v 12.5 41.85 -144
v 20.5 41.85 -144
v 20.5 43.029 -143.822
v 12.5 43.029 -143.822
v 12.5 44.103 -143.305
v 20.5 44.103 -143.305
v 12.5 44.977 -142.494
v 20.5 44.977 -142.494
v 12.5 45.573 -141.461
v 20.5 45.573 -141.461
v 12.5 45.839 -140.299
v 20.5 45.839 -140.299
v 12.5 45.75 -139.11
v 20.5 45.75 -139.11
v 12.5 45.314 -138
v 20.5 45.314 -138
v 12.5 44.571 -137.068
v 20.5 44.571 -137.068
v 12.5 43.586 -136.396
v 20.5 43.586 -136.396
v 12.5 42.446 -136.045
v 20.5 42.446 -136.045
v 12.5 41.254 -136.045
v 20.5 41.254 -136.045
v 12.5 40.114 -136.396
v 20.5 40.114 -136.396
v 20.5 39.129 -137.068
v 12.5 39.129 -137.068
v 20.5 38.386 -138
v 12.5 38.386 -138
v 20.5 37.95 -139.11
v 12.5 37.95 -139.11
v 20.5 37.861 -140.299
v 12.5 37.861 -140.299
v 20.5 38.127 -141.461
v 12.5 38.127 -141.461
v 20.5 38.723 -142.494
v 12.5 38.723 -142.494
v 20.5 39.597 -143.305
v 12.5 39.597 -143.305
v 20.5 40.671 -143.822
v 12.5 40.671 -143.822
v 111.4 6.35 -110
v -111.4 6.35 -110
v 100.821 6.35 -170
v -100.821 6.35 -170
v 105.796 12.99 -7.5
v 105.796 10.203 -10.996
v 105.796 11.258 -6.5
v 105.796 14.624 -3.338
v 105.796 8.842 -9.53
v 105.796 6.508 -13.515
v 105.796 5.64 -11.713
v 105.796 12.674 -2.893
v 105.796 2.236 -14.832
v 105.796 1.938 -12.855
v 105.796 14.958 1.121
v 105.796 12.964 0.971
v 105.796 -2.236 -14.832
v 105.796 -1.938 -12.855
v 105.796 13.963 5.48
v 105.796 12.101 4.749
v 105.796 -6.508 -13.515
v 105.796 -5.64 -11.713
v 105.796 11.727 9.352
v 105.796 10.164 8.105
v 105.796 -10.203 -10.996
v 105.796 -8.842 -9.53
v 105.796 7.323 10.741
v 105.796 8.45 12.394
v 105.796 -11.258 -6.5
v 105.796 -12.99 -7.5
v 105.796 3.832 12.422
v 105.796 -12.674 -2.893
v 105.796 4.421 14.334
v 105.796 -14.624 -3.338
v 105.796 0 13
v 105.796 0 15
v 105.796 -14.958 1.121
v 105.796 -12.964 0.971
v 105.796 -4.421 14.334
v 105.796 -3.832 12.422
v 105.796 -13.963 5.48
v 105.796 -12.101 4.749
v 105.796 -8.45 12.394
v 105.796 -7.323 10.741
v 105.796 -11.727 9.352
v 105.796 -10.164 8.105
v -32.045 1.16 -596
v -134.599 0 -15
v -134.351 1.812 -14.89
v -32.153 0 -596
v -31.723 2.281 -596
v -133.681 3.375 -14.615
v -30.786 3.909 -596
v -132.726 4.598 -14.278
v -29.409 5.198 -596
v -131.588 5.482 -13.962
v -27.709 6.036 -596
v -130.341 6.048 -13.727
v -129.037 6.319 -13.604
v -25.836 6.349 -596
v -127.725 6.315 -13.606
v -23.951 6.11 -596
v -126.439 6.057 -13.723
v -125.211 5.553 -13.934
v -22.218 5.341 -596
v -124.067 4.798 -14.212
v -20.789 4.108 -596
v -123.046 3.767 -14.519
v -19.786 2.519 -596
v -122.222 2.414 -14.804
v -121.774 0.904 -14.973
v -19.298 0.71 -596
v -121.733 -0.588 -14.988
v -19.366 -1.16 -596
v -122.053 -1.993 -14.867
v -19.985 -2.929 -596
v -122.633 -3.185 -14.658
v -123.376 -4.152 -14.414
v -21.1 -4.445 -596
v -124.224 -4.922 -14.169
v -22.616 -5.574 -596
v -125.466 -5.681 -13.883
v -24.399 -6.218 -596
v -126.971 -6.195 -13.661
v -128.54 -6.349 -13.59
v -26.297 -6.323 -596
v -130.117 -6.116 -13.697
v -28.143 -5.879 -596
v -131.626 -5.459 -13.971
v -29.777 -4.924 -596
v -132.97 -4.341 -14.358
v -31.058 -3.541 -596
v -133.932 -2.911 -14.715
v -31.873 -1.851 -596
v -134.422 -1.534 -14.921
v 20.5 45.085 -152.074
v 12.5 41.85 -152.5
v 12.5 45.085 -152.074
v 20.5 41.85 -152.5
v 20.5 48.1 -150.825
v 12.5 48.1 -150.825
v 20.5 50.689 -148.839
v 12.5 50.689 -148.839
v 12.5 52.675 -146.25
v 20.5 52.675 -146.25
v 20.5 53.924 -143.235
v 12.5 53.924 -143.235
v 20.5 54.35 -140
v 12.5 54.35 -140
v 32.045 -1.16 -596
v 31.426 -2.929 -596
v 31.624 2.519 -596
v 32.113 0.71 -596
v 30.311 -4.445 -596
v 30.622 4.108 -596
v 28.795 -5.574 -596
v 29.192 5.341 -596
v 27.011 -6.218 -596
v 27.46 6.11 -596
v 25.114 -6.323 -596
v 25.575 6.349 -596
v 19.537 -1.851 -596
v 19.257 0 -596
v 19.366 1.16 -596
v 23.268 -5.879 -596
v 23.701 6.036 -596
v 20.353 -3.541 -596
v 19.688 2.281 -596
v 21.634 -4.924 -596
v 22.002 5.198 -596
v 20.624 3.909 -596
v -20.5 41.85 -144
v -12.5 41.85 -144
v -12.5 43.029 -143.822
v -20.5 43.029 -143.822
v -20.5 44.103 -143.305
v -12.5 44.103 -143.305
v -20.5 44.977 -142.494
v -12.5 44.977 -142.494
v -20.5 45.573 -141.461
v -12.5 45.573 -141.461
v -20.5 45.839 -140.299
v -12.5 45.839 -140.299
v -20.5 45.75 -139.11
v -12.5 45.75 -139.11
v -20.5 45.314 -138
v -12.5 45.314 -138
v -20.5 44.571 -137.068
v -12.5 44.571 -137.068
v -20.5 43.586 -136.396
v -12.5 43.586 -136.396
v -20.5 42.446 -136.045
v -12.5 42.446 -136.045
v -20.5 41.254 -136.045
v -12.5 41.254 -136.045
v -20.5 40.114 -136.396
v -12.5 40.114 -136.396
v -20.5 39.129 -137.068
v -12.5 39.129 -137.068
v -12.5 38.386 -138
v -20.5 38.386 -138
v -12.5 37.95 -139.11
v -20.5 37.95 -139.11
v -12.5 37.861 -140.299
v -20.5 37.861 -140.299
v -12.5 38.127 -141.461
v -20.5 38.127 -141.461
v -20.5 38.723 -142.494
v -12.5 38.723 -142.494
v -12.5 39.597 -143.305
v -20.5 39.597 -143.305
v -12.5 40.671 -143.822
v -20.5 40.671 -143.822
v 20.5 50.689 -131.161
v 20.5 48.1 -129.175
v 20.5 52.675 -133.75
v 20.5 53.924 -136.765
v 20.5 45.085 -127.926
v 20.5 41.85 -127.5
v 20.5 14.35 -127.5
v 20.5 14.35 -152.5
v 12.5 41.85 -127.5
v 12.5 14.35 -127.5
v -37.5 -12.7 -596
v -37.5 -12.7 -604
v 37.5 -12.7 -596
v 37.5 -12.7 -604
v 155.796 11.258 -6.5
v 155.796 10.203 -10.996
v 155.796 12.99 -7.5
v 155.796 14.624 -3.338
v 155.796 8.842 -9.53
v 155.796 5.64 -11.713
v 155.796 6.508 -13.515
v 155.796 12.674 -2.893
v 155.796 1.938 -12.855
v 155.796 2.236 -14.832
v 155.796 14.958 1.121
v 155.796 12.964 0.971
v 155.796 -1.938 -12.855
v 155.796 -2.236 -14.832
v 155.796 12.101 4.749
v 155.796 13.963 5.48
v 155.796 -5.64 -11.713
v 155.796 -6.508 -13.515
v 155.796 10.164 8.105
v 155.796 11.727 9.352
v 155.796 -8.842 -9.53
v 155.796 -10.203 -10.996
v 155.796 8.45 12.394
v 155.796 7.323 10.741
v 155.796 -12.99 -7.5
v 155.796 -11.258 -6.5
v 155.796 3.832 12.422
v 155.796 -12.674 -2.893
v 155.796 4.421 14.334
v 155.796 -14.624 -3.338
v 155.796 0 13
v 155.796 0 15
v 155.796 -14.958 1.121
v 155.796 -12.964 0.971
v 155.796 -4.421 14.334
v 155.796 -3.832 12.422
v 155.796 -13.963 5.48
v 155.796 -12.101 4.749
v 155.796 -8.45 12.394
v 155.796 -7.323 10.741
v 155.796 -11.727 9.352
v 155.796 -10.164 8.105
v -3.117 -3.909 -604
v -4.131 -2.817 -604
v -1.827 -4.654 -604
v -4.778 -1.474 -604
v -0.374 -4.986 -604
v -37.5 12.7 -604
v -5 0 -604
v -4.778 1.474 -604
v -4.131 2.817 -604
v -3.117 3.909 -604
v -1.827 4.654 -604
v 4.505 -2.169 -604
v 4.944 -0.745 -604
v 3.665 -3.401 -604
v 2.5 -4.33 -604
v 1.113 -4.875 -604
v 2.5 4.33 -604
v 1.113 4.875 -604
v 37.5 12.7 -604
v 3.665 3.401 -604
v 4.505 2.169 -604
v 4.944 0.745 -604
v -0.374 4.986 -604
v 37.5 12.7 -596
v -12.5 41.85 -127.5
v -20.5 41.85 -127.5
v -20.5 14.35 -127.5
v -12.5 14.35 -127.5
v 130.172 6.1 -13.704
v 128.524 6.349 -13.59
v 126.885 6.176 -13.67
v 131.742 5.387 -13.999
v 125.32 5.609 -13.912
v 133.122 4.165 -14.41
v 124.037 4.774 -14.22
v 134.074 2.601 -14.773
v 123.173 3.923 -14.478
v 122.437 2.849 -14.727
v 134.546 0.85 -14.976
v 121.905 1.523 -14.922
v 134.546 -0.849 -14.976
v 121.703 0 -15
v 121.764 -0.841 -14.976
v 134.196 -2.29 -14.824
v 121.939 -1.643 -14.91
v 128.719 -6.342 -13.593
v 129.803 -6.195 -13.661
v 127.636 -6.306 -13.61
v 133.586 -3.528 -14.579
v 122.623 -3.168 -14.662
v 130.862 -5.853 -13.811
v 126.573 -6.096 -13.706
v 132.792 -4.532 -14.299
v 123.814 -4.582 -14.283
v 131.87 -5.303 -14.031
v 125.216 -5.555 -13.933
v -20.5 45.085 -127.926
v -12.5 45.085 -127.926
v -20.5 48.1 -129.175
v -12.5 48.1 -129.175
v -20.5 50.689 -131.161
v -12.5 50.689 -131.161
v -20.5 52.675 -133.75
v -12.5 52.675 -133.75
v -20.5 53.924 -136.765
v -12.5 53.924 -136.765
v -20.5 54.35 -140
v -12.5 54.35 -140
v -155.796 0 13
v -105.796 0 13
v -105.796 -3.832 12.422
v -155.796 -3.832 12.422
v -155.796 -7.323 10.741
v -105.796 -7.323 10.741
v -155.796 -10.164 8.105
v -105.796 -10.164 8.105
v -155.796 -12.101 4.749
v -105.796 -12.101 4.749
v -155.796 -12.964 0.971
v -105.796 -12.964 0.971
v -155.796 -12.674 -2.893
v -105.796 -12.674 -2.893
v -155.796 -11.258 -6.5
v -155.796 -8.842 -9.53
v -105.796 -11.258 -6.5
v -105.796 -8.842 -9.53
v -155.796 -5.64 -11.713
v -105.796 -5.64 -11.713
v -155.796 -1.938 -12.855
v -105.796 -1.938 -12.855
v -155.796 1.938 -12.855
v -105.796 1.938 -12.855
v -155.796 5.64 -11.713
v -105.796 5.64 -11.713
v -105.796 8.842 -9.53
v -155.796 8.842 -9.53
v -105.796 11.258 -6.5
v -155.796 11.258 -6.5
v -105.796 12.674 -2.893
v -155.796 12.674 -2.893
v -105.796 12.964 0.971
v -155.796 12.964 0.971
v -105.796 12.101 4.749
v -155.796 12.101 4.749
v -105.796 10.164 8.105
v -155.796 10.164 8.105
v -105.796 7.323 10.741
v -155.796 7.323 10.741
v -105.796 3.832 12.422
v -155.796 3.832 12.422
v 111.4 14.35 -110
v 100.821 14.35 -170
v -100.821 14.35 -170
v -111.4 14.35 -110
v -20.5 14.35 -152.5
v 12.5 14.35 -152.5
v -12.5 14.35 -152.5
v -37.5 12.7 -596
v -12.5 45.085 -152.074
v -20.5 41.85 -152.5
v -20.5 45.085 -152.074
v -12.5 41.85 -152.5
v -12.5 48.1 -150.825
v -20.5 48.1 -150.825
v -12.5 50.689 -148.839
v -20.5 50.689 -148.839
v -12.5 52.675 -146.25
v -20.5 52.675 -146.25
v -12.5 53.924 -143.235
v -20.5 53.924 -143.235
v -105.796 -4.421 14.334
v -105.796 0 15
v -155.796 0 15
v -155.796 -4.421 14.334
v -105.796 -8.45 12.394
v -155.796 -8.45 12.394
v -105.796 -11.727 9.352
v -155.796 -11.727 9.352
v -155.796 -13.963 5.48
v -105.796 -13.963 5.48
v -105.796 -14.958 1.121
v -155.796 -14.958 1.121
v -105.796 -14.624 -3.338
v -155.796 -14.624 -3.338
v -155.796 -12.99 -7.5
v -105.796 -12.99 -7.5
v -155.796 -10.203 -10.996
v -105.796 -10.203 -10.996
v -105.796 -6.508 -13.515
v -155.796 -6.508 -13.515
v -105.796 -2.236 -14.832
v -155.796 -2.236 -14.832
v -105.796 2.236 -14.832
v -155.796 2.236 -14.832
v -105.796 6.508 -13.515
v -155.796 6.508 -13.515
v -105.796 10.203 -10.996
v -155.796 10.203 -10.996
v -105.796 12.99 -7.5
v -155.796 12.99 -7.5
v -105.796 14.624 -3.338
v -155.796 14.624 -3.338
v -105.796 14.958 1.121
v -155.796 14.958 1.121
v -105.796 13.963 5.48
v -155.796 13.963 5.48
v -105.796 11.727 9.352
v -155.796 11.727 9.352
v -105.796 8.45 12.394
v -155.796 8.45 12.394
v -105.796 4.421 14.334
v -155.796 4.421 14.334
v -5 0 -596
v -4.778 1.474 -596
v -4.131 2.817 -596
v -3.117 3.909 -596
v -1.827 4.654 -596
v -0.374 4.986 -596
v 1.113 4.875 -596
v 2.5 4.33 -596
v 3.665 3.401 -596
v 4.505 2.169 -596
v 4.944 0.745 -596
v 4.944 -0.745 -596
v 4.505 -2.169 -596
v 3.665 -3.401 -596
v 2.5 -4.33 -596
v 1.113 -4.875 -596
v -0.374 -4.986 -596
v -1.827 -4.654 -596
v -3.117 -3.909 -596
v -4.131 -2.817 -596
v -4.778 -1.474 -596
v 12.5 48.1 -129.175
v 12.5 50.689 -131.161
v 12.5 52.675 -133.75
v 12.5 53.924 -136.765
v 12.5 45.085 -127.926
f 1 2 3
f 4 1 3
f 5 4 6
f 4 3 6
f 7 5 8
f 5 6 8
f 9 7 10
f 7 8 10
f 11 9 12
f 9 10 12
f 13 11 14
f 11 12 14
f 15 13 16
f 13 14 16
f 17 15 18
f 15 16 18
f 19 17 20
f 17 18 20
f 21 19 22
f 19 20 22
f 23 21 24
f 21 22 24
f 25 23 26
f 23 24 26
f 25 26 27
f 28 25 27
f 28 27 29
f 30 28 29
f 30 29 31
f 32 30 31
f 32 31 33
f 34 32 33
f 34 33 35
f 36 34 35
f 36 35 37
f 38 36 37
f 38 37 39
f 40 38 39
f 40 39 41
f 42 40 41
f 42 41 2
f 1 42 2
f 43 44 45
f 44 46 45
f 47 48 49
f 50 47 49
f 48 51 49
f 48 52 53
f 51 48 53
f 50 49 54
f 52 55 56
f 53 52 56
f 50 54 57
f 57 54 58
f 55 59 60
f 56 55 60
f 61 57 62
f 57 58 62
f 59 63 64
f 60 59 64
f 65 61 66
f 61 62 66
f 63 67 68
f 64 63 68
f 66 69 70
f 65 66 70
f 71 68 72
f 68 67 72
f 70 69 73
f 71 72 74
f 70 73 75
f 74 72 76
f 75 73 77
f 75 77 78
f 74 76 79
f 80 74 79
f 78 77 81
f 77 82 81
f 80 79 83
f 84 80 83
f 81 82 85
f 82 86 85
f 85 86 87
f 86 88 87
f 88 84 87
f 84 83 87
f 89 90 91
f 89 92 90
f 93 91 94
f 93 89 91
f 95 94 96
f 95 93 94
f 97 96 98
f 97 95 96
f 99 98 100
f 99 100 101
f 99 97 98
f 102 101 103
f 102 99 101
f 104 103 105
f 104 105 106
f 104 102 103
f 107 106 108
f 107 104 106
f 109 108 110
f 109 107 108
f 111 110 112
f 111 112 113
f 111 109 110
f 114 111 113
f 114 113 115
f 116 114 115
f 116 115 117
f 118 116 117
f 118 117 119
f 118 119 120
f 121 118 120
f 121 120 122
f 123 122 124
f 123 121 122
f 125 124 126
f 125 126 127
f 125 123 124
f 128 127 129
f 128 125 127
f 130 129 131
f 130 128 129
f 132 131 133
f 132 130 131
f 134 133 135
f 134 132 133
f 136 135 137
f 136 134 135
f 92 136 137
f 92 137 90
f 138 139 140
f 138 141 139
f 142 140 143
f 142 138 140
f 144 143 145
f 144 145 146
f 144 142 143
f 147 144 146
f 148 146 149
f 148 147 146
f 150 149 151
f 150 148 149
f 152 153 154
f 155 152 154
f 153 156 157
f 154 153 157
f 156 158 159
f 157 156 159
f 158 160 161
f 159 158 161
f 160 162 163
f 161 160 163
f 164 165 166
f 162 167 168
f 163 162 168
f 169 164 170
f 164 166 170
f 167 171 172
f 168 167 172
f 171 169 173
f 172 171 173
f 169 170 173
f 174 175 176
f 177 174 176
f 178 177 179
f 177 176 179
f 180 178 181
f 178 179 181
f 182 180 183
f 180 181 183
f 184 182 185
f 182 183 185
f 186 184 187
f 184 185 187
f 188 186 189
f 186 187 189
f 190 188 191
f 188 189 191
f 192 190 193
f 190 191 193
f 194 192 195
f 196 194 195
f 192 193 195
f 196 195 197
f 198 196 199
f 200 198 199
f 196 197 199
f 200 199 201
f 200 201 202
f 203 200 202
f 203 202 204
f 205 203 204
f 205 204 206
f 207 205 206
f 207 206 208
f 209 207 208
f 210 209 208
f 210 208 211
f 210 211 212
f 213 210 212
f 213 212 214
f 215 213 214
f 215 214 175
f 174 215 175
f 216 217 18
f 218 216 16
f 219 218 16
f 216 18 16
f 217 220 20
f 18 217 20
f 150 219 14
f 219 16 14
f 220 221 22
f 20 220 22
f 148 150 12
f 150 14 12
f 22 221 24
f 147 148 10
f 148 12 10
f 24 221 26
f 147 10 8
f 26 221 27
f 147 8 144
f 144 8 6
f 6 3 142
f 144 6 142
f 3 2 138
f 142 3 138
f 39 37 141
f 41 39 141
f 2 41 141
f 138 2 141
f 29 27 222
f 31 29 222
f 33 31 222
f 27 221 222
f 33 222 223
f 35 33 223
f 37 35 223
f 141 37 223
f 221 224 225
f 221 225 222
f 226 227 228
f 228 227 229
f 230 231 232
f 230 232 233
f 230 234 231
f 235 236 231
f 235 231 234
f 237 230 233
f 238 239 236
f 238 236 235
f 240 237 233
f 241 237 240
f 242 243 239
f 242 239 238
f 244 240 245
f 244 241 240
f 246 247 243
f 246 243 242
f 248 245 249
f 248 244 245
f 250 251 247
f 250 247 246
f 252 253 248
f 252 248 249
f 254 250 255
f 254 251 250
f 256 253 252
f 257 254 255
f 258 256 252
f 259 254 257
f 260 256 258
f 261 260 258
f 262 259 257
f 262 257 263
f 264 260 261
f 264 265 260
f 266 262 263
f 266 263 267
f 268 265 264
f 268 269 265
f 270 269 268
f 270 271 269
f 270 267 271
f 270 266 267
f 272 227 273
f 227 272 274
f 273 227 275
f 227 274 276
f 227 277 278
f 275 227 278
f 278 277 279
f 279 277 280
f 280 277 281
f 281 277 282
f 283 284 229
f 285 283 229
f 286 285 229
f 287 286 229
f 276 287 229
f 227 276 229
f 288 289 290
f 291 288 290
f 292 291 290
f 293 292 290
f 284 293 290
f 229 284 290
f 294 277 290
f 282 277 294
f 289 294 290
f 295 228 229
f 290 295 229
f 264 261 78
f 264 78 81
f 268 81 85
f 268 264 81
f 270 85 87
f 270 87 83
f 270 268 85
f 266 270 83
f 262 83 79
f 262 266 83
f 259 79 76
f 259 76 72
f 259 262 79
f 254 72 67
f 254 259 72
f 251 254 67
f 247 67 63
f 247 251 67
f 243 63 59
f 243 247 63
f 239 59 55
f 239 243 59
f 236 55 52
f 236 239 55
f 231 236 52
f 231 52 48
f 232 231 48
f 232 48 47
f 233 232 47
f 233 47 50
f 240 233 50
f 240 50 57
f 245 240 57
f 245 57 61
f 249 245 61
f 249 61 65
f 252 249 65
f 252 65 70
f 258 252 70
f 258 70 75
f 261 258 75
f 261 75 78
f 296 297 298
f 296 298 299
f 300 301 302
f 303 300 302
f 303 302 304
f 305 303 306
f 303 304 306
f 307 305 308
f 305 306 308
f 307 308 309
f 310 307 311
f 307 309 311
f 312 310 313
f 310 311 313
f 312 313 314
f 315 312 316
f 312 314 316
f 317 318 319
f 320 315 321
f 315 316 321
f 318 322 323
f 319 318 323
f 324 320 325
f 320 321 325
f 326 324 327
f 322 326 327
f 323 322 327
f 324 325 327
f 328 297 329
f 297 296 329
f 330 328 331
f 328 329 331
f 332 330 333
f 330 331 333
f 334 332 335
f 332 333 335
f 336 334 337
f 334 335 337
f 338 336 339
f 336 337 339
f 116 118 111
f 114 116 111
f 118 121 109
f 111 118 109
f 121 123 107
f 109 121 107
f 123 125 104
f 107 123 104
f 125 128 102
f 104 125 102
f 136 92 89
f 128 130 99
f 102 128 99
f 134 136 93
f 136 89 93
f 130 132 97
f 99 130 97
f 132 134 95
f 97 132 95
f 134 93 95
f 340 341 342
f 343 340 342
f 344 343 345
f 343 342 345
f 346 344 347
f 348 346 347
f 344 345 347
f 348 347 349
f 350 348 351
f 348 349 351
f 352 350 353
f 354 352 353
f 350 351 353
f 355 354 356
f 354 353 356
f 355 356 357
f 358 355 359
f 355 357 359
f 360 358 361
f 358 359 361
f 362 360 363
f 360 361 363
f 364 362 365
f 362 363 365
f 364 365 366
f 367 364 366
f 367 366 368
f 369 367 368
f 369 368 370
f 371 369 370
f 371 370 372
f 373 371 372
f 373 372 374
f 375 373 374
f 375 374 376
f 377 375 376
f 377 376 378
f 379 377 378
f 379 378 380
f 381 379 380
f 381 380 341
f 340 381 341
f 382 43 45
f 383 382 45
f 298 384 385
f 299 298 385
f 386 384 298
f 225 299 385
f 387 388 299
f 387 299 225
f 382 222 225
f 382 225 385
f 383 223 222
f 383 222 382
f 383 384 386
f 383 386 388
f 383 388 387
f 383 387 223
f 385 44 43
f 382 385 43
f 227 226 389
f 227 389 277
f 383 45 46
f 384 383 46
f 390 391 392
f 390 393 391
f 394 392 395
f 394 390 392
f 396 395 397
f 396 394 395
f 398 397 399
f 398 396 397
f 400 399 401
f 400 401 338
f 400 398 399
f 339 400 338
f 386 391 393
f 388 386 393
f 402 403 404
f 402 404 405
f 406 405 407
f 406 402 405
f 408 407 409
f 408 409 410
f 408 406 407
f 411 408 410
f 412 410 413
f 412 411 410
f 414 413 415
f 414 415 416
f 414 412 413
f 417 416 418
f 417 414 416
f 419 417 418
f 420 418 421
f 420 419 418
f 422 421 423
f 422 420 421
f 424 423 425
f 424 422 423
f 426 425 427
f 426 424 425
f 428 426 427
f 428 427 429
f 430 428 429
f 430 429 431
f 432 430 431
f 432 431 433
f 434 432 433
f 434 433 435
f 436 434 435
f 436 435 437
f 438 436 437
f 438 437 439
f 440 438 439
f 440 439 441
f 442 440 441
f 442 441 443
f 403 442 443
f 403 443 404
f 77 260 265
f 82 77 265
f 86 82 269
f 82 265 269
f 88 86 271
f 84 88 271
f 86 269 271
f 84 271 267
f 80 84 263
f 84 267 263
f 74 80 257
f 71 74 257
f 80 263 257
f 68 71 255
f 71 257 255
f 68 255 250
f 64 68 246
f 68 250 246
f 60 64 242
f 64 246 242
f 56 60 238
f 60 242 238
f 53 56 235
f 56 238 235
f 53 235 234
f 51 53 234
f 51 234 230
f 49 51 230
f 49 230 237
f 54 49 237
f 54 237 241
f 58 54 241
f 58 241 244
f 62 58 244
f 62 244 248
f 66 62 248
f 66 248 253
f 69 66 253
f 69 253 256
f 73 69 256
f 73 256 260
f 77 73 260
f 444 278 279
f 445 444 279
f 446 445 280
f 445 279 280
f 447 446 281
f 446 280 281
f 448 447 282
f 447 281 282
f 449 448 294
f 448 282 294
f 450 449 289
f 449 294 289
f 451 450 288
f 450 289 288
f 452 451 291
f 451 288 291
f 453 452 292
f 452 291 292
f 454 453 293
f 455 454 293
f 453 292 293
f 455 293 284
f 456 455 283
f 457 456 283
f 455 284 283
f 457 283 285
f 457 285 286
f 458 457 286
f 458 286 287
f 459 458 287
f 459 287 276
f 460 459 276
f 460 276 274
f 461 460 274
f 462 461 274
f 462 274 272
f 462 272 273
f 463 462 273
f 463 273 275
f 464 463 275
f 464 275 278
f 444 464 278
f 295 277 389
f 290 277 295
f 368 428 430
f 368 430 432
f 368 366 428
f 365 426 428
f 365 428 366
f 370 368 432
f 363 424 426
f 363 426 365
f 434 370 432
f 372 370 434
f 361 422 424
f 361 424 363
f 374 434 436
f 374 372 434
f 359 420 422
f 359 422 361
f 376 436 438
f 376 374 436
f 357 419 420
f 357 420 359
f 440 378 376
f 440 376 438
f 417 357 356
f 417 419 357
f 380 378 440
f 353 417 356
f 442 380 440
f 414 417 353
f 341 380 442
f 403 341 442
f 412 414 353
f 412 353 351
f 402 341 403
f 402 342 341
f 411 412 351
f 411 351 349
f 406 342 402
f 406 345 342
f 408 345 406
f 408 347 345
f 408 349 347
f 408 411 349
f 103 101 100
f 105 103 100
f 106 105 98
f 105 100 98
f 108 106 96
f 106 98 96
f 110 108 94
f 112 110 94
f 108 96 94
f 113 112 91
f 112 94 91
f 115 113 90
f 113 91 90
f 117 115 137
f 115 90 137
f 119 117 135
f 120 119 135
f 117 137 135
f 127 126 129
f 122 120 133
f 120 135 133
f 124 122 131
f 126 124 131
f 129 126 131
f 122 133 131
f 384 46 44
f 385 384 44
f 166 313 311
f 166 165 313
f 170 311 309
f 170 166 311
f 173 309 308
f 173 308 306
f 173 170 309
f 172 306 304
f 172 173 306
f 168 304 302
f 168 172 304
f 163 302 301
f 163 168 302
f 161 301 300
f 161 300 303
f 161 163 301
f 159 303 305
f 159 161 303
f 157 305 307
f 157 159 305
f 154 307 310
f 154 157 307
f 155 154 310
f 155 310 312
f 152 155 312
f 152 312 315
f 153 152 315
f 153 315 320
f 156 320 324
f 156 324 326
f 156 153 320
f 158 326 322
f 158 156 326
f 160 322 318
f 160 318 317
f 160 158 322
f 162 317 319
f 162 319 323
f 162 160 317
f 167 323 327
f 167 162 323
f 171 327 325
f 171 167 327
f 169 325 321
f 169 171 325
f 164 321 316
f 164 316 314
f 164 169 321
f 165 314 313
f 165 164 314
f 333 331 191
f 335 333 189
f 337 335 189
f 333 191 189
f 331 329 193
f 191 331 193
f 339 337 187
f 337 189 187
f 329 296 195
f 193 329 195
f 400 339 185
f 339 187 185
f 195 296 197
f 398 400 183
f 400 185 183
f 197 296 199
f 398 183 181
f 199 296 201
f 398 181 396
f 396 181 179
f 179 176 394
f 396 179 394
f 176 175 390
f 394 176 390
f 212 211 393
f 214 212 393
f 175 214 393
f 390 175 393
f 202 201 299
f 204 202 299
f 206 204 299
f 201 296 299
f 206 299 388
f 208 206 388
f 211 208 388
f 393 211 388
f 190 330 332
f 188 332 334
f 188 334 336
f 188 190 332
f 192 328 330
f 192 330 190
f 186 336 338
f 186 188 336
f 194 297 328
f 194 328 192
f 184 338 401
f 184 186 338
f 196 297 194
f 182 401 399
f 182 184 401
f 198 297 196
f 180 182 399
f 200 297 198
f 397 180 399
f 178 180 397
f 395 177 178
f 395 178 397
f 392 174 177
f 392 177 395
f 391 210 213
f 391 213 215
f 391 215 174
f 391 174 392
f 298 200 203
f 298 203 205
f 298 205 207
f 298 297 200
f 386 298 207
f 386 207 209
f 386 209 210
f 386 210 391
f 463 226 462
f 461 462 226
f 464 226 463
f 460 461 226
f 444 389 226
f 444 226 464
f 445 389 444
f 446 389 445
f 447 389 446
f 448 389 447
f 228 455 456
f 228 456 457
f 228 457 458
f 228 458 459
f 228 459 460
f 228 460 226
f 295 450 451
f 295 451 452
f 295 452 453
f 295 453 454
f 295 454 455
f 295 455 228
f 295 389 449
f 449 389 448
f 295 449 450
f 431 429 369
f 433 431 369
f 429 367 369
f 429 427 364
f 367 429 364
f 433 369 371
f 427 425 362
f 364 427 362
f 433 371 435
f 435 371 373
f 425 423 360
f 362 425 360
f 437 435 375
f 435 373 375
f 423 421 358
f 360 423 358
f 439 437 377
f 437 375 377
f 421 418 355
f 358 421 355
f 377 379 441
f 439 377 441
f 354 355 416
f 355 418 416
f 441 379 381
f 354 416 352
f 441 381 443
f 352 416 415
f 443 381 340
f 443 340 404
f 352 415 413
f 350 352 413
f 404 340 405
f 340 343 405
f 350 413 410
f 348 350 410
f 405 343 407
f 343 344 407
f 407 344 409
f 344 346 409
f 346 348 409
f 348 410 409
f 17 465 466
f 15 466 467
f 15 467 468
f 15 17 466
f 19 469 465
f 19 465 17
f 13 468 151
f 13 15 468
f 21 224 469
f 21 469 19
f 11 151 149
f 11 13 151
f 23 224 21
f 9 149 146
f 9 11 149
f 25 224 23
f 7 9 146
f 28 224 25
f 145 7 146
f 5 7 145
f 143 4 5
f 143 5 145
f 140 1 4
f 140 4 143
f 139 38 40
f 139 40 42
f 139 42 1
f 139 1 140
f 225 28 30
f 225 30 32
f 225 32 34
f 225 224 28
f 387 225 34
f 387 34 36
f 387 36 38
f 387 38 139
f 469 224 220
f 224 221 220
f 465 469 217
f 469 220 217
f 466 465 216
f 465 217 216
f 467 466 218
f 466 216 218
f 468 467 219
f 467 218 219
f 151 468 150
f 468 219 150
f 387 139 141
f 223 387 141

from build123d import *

# Parameters (mm, degrees)
SWEEP2_PROFILE_R        = 6.35
SWEEP3_PROFILE_R        = 6.35
SWEEP_THIN2_PROFILE_R   = 15
SWEEP_THIN2_PROFILE_R_2 = 13
SWEEP_THIN3_PROFILE_R   = 15
SWEEP_THIN3_PROFILE_R_2 = 13
SKETCH161_W             = 75
SKETCH161_H             = 8
BOSS_EXTRUDE1_DEPTH     = 12.7
SKETCH164_W             = 8
SKETCH164_H             = 25.4
CUT_EXTRUDE1_DEPTH      = 635.353542167
SKETCH165_R             = 15
CUT_EXTRUDE2_DEPTH      = 680.802036854
SKETCH166_R             = 5
CUT_EXTRUDE3_DEPTH      = 25.4
BOSS_EXTRUDE2_DEPTH     = 8
SKETCH168_W             = 8
SKETCH168_H             = 25
BOSS_EXTRUDE3_DEPTH     = 40
FILLET1_R               = 12.5
SKETCH170_R             = 4
CUT_EXTRUDE4_DEPTH      = 632.545935426


with BuildPart() as part:
    # Sweep2: sweep along a path in Sketch1
    with BuildLine(Plane(origin=(0, 0, 0), x_dir=(1, 0, 0), z_dir=(0, 1, 0))) as sweep2_path:
        Line((130.796188425, 0), (25, 600))
    # Sweep2 profile (on start of the path) → Sweep2 (sweep)
    with BuildSketch(Plane(origin=(130.796188425, 0, 0), x_dir=(-0.9848077530122079, 0, 0.17364817766693125), z_dir=(-0.17364817766693125, 0, -0.9848077530122079))):
        Circle(SWEEP2_PROFILE_R)
    sweep(path=sweep2_path.line)


with BuildPart() as body_2:
    # Sweep3: sweep along a path in Sketch78
    with BuildLine(Plane(origin=(0, 0, 0), x_dir=(1, 0, 0), z_dir=(0, 1, 0))) as sweep3_path:
        Line((-130.796188425, 0), (-25, 600))
    # Sweep3 profile (on start of the path) → Sweep3 (sweep)
    with BuildSketch(Plane(origin=(-130.796188425, 0, 0), x_dir=(-0.9848077530122079, 0, -0.17364817766693125), z_dir=(0.17364817766693125, 0, -0.9848077530122079))):
        Circle(SWEEP3_PROFILE_R)
    sweep(path=sweep3_path.line)


with BuildPart() as body_3:
    # Sweep-Thin2: sweep along a path in Sketch87
    with BuildLine(Plane(origin=(0, 0, 0), x_dir=(1, 0, 0), z_dir=(0, 1, 0))) as sweep_thin2_path:
        Line((-155.796188425, 0), (-105.796188425, 0))
    # Sweep-Thin2 profile (on start of the path) → Sweep-Thin2 (sweep)
    with BuildSketch(Plane(origin=(-155.796188425, 0, 0), x_dir=(0, 0, 1), z_dir=(1, 0, 0))):
        Circle(SWEEP_THIN2_PROFILE_R)
        Circle(SWEEP_THIN2_PROFILE_R_2, mode=Mode.SUBTRACT)
    sweep(path=sweep_thin2_path.line)


with BuildPart() as body_4:
    # Sweep-Thin3: sweep along a path in Sketch140
    with BuildLine(Plane(origin=(0, 0, 0), x_dir=(1, 0, 0), z_dir=(0, 1, 0))) as sweep_thin3_path:
        Line((105.796188425, 0), (155.796188425, 0))
    # Sweep-Thin3 profile (on start of the path) → Sweep-Thin3 (sweep)
    with BuildSketch(Plane(origin=(105.796188425, 0, 0), x_dir=(0, 0, 1), z_dir=(1, 0, 0))):
        Circle(SWEEP_THIN3_PROFILE_R)
        Circle(SWEEP_THIN3_PROFILE_R_2, mode=Mode.SUBTRACT)
    sweep(path=sweep_thin3_path.line)


with BuildPart() as body_5:
    # Sketch161 → Boss-Extrude1 (new, symmetric)
    with BuildSketch(Plane(origin=(0, 0, 0), x_dir=(1, 0, 0), z_dir=(0, 1, 0))):
        with Locations((0, 600)):
            Rectangle(SKETCH161_W, SKETCH161_H)
    extrude(amount=BOSS_EXTRUDE1_DEPTH, both=True)

    # Sketch166 → Cut-Extrude3 (cut)
    with BuildSketch(Plane(origin=(0, 0, -604), x_dir=(-1, 0, 0), z_dir=(0, 0, -1))):
        Circle(SKETCH166_R)
    extrude(amount=-CUT_EXTRUDE3_DEPTH, mode=Mode.SUBTRACT)


with BuildPart() as cut_extrude1_tool:
    # Sketch164 → Cut-Extrude1 (new, through all)
    with BuildSketch(Plane.ZY.offset(37.5)):
        with Locations((-600, 0)):
            Rectangle(SKETCH164_W, SKETCH164_H)
    extrude(amount=-CUT_EXTRUDE1_DEPTH)


with BuildPart() as body_2_1:
    add(body_2.part)

    # Cut-Extrude1: cut by cut_extrude1_tool
    add(cut_extrude1_tool.part, mode=Mode.SUBTRACT)


with BuildPart() as part_1:
    add(part.part)

    # Cut-Extrude1: cut by cut_extrude1_tool
    add(cut_extrude1_tool.part, mode=Mode.SUBTRACT)


with BuildPart() as cut_extrude2_tool:
    # Sketch165 → Cut-Extrude2 (new, through all)
    with BuildSketch(Plane.ZY.offset(155.796188425)):
        with Locations(Location((0, 0, 0), (0, 0, 180))):
            Circle(SKETCH165_R)
    extrude(amount=-CUT_EXTRUDE2_DEPTH)


with BuildPart() as body_2_2:
    add(body_2_1.part)

    # Cut-Extrude2: cut by cut_extrude2_tool
    add(cut_extrude2_tool.part, mode=Mode.SUBTRACT)


with BuildPart() as part_2:
    add(part_1.part)

    # Cut-Extrude2: cut by cut_extrude2_tool
    add(cut_extrude2_tool.part, mode=Mode.SUBTRACT)


with BuildPart() as body_6:
    # Sketch167 → Boss-Extrude2 (new body)
    with BuildSketch(Plane(origin=(0, 6.35, 0), x_dir=(1, 0, 0), z_dir=(0, 1, 0))):
        Polygon((-111.400220547, 110), (111.400220547, 110), (100.820601705, 170), (-100.820601705, 170), align=None)
    extrude(amount=BOSS_EXTRUDE2_DEPTH)

    # Sketch168 → Boss-Extrude3 (add)
    with BuildSketch(Plane(origin=(0, 14.35, 0), x_dir=(1, 0, 0), z_dir=(0, 1, 0))):
        with Locations((-16.5, 140)):
            Rectangle(SKETCH168_W, SKETCH168_H)
        with Locations((16.5, 140)):
            Rectangle(SKETCH168_W, SKETCH168_H)
    extrude(amount=BOSS_EXTRUDE3_DEPTH)

    # Fillet1
    fillet1_edges = [body_6.edges().sort_by_distance(p)[0] for p in [
        (16.5, 54.35, -152.5),
        (16.5, 54.35, -127.5),
        (-16.5, 54.35, -152.5),
        (-16.5, 54.35, -127.5),
    ]]
    fillet(fillet1_edges, radius=FILLET1_R - 0.0001)  # a hair under: the kernel refuses the full size

    # Sketch170 → Cut-Extrude4 (cut, through all)
    with BuildSketch(Plane(origin=(20.5, 0, 0), x_dir=(0, 0, -1), z_dir=(1, 0, 0))):
        with Locations((140, 41.85)):
            Circle(SKETCH170_R)
    extrude(amount=-CUT_EXTRUDE4_DEPTH, mode=Mode.SUBTRACT)


solid = Compound([body_3.part, body_4.part, body_5.part, body_2_2.part, part_2.part, body_6.part])
